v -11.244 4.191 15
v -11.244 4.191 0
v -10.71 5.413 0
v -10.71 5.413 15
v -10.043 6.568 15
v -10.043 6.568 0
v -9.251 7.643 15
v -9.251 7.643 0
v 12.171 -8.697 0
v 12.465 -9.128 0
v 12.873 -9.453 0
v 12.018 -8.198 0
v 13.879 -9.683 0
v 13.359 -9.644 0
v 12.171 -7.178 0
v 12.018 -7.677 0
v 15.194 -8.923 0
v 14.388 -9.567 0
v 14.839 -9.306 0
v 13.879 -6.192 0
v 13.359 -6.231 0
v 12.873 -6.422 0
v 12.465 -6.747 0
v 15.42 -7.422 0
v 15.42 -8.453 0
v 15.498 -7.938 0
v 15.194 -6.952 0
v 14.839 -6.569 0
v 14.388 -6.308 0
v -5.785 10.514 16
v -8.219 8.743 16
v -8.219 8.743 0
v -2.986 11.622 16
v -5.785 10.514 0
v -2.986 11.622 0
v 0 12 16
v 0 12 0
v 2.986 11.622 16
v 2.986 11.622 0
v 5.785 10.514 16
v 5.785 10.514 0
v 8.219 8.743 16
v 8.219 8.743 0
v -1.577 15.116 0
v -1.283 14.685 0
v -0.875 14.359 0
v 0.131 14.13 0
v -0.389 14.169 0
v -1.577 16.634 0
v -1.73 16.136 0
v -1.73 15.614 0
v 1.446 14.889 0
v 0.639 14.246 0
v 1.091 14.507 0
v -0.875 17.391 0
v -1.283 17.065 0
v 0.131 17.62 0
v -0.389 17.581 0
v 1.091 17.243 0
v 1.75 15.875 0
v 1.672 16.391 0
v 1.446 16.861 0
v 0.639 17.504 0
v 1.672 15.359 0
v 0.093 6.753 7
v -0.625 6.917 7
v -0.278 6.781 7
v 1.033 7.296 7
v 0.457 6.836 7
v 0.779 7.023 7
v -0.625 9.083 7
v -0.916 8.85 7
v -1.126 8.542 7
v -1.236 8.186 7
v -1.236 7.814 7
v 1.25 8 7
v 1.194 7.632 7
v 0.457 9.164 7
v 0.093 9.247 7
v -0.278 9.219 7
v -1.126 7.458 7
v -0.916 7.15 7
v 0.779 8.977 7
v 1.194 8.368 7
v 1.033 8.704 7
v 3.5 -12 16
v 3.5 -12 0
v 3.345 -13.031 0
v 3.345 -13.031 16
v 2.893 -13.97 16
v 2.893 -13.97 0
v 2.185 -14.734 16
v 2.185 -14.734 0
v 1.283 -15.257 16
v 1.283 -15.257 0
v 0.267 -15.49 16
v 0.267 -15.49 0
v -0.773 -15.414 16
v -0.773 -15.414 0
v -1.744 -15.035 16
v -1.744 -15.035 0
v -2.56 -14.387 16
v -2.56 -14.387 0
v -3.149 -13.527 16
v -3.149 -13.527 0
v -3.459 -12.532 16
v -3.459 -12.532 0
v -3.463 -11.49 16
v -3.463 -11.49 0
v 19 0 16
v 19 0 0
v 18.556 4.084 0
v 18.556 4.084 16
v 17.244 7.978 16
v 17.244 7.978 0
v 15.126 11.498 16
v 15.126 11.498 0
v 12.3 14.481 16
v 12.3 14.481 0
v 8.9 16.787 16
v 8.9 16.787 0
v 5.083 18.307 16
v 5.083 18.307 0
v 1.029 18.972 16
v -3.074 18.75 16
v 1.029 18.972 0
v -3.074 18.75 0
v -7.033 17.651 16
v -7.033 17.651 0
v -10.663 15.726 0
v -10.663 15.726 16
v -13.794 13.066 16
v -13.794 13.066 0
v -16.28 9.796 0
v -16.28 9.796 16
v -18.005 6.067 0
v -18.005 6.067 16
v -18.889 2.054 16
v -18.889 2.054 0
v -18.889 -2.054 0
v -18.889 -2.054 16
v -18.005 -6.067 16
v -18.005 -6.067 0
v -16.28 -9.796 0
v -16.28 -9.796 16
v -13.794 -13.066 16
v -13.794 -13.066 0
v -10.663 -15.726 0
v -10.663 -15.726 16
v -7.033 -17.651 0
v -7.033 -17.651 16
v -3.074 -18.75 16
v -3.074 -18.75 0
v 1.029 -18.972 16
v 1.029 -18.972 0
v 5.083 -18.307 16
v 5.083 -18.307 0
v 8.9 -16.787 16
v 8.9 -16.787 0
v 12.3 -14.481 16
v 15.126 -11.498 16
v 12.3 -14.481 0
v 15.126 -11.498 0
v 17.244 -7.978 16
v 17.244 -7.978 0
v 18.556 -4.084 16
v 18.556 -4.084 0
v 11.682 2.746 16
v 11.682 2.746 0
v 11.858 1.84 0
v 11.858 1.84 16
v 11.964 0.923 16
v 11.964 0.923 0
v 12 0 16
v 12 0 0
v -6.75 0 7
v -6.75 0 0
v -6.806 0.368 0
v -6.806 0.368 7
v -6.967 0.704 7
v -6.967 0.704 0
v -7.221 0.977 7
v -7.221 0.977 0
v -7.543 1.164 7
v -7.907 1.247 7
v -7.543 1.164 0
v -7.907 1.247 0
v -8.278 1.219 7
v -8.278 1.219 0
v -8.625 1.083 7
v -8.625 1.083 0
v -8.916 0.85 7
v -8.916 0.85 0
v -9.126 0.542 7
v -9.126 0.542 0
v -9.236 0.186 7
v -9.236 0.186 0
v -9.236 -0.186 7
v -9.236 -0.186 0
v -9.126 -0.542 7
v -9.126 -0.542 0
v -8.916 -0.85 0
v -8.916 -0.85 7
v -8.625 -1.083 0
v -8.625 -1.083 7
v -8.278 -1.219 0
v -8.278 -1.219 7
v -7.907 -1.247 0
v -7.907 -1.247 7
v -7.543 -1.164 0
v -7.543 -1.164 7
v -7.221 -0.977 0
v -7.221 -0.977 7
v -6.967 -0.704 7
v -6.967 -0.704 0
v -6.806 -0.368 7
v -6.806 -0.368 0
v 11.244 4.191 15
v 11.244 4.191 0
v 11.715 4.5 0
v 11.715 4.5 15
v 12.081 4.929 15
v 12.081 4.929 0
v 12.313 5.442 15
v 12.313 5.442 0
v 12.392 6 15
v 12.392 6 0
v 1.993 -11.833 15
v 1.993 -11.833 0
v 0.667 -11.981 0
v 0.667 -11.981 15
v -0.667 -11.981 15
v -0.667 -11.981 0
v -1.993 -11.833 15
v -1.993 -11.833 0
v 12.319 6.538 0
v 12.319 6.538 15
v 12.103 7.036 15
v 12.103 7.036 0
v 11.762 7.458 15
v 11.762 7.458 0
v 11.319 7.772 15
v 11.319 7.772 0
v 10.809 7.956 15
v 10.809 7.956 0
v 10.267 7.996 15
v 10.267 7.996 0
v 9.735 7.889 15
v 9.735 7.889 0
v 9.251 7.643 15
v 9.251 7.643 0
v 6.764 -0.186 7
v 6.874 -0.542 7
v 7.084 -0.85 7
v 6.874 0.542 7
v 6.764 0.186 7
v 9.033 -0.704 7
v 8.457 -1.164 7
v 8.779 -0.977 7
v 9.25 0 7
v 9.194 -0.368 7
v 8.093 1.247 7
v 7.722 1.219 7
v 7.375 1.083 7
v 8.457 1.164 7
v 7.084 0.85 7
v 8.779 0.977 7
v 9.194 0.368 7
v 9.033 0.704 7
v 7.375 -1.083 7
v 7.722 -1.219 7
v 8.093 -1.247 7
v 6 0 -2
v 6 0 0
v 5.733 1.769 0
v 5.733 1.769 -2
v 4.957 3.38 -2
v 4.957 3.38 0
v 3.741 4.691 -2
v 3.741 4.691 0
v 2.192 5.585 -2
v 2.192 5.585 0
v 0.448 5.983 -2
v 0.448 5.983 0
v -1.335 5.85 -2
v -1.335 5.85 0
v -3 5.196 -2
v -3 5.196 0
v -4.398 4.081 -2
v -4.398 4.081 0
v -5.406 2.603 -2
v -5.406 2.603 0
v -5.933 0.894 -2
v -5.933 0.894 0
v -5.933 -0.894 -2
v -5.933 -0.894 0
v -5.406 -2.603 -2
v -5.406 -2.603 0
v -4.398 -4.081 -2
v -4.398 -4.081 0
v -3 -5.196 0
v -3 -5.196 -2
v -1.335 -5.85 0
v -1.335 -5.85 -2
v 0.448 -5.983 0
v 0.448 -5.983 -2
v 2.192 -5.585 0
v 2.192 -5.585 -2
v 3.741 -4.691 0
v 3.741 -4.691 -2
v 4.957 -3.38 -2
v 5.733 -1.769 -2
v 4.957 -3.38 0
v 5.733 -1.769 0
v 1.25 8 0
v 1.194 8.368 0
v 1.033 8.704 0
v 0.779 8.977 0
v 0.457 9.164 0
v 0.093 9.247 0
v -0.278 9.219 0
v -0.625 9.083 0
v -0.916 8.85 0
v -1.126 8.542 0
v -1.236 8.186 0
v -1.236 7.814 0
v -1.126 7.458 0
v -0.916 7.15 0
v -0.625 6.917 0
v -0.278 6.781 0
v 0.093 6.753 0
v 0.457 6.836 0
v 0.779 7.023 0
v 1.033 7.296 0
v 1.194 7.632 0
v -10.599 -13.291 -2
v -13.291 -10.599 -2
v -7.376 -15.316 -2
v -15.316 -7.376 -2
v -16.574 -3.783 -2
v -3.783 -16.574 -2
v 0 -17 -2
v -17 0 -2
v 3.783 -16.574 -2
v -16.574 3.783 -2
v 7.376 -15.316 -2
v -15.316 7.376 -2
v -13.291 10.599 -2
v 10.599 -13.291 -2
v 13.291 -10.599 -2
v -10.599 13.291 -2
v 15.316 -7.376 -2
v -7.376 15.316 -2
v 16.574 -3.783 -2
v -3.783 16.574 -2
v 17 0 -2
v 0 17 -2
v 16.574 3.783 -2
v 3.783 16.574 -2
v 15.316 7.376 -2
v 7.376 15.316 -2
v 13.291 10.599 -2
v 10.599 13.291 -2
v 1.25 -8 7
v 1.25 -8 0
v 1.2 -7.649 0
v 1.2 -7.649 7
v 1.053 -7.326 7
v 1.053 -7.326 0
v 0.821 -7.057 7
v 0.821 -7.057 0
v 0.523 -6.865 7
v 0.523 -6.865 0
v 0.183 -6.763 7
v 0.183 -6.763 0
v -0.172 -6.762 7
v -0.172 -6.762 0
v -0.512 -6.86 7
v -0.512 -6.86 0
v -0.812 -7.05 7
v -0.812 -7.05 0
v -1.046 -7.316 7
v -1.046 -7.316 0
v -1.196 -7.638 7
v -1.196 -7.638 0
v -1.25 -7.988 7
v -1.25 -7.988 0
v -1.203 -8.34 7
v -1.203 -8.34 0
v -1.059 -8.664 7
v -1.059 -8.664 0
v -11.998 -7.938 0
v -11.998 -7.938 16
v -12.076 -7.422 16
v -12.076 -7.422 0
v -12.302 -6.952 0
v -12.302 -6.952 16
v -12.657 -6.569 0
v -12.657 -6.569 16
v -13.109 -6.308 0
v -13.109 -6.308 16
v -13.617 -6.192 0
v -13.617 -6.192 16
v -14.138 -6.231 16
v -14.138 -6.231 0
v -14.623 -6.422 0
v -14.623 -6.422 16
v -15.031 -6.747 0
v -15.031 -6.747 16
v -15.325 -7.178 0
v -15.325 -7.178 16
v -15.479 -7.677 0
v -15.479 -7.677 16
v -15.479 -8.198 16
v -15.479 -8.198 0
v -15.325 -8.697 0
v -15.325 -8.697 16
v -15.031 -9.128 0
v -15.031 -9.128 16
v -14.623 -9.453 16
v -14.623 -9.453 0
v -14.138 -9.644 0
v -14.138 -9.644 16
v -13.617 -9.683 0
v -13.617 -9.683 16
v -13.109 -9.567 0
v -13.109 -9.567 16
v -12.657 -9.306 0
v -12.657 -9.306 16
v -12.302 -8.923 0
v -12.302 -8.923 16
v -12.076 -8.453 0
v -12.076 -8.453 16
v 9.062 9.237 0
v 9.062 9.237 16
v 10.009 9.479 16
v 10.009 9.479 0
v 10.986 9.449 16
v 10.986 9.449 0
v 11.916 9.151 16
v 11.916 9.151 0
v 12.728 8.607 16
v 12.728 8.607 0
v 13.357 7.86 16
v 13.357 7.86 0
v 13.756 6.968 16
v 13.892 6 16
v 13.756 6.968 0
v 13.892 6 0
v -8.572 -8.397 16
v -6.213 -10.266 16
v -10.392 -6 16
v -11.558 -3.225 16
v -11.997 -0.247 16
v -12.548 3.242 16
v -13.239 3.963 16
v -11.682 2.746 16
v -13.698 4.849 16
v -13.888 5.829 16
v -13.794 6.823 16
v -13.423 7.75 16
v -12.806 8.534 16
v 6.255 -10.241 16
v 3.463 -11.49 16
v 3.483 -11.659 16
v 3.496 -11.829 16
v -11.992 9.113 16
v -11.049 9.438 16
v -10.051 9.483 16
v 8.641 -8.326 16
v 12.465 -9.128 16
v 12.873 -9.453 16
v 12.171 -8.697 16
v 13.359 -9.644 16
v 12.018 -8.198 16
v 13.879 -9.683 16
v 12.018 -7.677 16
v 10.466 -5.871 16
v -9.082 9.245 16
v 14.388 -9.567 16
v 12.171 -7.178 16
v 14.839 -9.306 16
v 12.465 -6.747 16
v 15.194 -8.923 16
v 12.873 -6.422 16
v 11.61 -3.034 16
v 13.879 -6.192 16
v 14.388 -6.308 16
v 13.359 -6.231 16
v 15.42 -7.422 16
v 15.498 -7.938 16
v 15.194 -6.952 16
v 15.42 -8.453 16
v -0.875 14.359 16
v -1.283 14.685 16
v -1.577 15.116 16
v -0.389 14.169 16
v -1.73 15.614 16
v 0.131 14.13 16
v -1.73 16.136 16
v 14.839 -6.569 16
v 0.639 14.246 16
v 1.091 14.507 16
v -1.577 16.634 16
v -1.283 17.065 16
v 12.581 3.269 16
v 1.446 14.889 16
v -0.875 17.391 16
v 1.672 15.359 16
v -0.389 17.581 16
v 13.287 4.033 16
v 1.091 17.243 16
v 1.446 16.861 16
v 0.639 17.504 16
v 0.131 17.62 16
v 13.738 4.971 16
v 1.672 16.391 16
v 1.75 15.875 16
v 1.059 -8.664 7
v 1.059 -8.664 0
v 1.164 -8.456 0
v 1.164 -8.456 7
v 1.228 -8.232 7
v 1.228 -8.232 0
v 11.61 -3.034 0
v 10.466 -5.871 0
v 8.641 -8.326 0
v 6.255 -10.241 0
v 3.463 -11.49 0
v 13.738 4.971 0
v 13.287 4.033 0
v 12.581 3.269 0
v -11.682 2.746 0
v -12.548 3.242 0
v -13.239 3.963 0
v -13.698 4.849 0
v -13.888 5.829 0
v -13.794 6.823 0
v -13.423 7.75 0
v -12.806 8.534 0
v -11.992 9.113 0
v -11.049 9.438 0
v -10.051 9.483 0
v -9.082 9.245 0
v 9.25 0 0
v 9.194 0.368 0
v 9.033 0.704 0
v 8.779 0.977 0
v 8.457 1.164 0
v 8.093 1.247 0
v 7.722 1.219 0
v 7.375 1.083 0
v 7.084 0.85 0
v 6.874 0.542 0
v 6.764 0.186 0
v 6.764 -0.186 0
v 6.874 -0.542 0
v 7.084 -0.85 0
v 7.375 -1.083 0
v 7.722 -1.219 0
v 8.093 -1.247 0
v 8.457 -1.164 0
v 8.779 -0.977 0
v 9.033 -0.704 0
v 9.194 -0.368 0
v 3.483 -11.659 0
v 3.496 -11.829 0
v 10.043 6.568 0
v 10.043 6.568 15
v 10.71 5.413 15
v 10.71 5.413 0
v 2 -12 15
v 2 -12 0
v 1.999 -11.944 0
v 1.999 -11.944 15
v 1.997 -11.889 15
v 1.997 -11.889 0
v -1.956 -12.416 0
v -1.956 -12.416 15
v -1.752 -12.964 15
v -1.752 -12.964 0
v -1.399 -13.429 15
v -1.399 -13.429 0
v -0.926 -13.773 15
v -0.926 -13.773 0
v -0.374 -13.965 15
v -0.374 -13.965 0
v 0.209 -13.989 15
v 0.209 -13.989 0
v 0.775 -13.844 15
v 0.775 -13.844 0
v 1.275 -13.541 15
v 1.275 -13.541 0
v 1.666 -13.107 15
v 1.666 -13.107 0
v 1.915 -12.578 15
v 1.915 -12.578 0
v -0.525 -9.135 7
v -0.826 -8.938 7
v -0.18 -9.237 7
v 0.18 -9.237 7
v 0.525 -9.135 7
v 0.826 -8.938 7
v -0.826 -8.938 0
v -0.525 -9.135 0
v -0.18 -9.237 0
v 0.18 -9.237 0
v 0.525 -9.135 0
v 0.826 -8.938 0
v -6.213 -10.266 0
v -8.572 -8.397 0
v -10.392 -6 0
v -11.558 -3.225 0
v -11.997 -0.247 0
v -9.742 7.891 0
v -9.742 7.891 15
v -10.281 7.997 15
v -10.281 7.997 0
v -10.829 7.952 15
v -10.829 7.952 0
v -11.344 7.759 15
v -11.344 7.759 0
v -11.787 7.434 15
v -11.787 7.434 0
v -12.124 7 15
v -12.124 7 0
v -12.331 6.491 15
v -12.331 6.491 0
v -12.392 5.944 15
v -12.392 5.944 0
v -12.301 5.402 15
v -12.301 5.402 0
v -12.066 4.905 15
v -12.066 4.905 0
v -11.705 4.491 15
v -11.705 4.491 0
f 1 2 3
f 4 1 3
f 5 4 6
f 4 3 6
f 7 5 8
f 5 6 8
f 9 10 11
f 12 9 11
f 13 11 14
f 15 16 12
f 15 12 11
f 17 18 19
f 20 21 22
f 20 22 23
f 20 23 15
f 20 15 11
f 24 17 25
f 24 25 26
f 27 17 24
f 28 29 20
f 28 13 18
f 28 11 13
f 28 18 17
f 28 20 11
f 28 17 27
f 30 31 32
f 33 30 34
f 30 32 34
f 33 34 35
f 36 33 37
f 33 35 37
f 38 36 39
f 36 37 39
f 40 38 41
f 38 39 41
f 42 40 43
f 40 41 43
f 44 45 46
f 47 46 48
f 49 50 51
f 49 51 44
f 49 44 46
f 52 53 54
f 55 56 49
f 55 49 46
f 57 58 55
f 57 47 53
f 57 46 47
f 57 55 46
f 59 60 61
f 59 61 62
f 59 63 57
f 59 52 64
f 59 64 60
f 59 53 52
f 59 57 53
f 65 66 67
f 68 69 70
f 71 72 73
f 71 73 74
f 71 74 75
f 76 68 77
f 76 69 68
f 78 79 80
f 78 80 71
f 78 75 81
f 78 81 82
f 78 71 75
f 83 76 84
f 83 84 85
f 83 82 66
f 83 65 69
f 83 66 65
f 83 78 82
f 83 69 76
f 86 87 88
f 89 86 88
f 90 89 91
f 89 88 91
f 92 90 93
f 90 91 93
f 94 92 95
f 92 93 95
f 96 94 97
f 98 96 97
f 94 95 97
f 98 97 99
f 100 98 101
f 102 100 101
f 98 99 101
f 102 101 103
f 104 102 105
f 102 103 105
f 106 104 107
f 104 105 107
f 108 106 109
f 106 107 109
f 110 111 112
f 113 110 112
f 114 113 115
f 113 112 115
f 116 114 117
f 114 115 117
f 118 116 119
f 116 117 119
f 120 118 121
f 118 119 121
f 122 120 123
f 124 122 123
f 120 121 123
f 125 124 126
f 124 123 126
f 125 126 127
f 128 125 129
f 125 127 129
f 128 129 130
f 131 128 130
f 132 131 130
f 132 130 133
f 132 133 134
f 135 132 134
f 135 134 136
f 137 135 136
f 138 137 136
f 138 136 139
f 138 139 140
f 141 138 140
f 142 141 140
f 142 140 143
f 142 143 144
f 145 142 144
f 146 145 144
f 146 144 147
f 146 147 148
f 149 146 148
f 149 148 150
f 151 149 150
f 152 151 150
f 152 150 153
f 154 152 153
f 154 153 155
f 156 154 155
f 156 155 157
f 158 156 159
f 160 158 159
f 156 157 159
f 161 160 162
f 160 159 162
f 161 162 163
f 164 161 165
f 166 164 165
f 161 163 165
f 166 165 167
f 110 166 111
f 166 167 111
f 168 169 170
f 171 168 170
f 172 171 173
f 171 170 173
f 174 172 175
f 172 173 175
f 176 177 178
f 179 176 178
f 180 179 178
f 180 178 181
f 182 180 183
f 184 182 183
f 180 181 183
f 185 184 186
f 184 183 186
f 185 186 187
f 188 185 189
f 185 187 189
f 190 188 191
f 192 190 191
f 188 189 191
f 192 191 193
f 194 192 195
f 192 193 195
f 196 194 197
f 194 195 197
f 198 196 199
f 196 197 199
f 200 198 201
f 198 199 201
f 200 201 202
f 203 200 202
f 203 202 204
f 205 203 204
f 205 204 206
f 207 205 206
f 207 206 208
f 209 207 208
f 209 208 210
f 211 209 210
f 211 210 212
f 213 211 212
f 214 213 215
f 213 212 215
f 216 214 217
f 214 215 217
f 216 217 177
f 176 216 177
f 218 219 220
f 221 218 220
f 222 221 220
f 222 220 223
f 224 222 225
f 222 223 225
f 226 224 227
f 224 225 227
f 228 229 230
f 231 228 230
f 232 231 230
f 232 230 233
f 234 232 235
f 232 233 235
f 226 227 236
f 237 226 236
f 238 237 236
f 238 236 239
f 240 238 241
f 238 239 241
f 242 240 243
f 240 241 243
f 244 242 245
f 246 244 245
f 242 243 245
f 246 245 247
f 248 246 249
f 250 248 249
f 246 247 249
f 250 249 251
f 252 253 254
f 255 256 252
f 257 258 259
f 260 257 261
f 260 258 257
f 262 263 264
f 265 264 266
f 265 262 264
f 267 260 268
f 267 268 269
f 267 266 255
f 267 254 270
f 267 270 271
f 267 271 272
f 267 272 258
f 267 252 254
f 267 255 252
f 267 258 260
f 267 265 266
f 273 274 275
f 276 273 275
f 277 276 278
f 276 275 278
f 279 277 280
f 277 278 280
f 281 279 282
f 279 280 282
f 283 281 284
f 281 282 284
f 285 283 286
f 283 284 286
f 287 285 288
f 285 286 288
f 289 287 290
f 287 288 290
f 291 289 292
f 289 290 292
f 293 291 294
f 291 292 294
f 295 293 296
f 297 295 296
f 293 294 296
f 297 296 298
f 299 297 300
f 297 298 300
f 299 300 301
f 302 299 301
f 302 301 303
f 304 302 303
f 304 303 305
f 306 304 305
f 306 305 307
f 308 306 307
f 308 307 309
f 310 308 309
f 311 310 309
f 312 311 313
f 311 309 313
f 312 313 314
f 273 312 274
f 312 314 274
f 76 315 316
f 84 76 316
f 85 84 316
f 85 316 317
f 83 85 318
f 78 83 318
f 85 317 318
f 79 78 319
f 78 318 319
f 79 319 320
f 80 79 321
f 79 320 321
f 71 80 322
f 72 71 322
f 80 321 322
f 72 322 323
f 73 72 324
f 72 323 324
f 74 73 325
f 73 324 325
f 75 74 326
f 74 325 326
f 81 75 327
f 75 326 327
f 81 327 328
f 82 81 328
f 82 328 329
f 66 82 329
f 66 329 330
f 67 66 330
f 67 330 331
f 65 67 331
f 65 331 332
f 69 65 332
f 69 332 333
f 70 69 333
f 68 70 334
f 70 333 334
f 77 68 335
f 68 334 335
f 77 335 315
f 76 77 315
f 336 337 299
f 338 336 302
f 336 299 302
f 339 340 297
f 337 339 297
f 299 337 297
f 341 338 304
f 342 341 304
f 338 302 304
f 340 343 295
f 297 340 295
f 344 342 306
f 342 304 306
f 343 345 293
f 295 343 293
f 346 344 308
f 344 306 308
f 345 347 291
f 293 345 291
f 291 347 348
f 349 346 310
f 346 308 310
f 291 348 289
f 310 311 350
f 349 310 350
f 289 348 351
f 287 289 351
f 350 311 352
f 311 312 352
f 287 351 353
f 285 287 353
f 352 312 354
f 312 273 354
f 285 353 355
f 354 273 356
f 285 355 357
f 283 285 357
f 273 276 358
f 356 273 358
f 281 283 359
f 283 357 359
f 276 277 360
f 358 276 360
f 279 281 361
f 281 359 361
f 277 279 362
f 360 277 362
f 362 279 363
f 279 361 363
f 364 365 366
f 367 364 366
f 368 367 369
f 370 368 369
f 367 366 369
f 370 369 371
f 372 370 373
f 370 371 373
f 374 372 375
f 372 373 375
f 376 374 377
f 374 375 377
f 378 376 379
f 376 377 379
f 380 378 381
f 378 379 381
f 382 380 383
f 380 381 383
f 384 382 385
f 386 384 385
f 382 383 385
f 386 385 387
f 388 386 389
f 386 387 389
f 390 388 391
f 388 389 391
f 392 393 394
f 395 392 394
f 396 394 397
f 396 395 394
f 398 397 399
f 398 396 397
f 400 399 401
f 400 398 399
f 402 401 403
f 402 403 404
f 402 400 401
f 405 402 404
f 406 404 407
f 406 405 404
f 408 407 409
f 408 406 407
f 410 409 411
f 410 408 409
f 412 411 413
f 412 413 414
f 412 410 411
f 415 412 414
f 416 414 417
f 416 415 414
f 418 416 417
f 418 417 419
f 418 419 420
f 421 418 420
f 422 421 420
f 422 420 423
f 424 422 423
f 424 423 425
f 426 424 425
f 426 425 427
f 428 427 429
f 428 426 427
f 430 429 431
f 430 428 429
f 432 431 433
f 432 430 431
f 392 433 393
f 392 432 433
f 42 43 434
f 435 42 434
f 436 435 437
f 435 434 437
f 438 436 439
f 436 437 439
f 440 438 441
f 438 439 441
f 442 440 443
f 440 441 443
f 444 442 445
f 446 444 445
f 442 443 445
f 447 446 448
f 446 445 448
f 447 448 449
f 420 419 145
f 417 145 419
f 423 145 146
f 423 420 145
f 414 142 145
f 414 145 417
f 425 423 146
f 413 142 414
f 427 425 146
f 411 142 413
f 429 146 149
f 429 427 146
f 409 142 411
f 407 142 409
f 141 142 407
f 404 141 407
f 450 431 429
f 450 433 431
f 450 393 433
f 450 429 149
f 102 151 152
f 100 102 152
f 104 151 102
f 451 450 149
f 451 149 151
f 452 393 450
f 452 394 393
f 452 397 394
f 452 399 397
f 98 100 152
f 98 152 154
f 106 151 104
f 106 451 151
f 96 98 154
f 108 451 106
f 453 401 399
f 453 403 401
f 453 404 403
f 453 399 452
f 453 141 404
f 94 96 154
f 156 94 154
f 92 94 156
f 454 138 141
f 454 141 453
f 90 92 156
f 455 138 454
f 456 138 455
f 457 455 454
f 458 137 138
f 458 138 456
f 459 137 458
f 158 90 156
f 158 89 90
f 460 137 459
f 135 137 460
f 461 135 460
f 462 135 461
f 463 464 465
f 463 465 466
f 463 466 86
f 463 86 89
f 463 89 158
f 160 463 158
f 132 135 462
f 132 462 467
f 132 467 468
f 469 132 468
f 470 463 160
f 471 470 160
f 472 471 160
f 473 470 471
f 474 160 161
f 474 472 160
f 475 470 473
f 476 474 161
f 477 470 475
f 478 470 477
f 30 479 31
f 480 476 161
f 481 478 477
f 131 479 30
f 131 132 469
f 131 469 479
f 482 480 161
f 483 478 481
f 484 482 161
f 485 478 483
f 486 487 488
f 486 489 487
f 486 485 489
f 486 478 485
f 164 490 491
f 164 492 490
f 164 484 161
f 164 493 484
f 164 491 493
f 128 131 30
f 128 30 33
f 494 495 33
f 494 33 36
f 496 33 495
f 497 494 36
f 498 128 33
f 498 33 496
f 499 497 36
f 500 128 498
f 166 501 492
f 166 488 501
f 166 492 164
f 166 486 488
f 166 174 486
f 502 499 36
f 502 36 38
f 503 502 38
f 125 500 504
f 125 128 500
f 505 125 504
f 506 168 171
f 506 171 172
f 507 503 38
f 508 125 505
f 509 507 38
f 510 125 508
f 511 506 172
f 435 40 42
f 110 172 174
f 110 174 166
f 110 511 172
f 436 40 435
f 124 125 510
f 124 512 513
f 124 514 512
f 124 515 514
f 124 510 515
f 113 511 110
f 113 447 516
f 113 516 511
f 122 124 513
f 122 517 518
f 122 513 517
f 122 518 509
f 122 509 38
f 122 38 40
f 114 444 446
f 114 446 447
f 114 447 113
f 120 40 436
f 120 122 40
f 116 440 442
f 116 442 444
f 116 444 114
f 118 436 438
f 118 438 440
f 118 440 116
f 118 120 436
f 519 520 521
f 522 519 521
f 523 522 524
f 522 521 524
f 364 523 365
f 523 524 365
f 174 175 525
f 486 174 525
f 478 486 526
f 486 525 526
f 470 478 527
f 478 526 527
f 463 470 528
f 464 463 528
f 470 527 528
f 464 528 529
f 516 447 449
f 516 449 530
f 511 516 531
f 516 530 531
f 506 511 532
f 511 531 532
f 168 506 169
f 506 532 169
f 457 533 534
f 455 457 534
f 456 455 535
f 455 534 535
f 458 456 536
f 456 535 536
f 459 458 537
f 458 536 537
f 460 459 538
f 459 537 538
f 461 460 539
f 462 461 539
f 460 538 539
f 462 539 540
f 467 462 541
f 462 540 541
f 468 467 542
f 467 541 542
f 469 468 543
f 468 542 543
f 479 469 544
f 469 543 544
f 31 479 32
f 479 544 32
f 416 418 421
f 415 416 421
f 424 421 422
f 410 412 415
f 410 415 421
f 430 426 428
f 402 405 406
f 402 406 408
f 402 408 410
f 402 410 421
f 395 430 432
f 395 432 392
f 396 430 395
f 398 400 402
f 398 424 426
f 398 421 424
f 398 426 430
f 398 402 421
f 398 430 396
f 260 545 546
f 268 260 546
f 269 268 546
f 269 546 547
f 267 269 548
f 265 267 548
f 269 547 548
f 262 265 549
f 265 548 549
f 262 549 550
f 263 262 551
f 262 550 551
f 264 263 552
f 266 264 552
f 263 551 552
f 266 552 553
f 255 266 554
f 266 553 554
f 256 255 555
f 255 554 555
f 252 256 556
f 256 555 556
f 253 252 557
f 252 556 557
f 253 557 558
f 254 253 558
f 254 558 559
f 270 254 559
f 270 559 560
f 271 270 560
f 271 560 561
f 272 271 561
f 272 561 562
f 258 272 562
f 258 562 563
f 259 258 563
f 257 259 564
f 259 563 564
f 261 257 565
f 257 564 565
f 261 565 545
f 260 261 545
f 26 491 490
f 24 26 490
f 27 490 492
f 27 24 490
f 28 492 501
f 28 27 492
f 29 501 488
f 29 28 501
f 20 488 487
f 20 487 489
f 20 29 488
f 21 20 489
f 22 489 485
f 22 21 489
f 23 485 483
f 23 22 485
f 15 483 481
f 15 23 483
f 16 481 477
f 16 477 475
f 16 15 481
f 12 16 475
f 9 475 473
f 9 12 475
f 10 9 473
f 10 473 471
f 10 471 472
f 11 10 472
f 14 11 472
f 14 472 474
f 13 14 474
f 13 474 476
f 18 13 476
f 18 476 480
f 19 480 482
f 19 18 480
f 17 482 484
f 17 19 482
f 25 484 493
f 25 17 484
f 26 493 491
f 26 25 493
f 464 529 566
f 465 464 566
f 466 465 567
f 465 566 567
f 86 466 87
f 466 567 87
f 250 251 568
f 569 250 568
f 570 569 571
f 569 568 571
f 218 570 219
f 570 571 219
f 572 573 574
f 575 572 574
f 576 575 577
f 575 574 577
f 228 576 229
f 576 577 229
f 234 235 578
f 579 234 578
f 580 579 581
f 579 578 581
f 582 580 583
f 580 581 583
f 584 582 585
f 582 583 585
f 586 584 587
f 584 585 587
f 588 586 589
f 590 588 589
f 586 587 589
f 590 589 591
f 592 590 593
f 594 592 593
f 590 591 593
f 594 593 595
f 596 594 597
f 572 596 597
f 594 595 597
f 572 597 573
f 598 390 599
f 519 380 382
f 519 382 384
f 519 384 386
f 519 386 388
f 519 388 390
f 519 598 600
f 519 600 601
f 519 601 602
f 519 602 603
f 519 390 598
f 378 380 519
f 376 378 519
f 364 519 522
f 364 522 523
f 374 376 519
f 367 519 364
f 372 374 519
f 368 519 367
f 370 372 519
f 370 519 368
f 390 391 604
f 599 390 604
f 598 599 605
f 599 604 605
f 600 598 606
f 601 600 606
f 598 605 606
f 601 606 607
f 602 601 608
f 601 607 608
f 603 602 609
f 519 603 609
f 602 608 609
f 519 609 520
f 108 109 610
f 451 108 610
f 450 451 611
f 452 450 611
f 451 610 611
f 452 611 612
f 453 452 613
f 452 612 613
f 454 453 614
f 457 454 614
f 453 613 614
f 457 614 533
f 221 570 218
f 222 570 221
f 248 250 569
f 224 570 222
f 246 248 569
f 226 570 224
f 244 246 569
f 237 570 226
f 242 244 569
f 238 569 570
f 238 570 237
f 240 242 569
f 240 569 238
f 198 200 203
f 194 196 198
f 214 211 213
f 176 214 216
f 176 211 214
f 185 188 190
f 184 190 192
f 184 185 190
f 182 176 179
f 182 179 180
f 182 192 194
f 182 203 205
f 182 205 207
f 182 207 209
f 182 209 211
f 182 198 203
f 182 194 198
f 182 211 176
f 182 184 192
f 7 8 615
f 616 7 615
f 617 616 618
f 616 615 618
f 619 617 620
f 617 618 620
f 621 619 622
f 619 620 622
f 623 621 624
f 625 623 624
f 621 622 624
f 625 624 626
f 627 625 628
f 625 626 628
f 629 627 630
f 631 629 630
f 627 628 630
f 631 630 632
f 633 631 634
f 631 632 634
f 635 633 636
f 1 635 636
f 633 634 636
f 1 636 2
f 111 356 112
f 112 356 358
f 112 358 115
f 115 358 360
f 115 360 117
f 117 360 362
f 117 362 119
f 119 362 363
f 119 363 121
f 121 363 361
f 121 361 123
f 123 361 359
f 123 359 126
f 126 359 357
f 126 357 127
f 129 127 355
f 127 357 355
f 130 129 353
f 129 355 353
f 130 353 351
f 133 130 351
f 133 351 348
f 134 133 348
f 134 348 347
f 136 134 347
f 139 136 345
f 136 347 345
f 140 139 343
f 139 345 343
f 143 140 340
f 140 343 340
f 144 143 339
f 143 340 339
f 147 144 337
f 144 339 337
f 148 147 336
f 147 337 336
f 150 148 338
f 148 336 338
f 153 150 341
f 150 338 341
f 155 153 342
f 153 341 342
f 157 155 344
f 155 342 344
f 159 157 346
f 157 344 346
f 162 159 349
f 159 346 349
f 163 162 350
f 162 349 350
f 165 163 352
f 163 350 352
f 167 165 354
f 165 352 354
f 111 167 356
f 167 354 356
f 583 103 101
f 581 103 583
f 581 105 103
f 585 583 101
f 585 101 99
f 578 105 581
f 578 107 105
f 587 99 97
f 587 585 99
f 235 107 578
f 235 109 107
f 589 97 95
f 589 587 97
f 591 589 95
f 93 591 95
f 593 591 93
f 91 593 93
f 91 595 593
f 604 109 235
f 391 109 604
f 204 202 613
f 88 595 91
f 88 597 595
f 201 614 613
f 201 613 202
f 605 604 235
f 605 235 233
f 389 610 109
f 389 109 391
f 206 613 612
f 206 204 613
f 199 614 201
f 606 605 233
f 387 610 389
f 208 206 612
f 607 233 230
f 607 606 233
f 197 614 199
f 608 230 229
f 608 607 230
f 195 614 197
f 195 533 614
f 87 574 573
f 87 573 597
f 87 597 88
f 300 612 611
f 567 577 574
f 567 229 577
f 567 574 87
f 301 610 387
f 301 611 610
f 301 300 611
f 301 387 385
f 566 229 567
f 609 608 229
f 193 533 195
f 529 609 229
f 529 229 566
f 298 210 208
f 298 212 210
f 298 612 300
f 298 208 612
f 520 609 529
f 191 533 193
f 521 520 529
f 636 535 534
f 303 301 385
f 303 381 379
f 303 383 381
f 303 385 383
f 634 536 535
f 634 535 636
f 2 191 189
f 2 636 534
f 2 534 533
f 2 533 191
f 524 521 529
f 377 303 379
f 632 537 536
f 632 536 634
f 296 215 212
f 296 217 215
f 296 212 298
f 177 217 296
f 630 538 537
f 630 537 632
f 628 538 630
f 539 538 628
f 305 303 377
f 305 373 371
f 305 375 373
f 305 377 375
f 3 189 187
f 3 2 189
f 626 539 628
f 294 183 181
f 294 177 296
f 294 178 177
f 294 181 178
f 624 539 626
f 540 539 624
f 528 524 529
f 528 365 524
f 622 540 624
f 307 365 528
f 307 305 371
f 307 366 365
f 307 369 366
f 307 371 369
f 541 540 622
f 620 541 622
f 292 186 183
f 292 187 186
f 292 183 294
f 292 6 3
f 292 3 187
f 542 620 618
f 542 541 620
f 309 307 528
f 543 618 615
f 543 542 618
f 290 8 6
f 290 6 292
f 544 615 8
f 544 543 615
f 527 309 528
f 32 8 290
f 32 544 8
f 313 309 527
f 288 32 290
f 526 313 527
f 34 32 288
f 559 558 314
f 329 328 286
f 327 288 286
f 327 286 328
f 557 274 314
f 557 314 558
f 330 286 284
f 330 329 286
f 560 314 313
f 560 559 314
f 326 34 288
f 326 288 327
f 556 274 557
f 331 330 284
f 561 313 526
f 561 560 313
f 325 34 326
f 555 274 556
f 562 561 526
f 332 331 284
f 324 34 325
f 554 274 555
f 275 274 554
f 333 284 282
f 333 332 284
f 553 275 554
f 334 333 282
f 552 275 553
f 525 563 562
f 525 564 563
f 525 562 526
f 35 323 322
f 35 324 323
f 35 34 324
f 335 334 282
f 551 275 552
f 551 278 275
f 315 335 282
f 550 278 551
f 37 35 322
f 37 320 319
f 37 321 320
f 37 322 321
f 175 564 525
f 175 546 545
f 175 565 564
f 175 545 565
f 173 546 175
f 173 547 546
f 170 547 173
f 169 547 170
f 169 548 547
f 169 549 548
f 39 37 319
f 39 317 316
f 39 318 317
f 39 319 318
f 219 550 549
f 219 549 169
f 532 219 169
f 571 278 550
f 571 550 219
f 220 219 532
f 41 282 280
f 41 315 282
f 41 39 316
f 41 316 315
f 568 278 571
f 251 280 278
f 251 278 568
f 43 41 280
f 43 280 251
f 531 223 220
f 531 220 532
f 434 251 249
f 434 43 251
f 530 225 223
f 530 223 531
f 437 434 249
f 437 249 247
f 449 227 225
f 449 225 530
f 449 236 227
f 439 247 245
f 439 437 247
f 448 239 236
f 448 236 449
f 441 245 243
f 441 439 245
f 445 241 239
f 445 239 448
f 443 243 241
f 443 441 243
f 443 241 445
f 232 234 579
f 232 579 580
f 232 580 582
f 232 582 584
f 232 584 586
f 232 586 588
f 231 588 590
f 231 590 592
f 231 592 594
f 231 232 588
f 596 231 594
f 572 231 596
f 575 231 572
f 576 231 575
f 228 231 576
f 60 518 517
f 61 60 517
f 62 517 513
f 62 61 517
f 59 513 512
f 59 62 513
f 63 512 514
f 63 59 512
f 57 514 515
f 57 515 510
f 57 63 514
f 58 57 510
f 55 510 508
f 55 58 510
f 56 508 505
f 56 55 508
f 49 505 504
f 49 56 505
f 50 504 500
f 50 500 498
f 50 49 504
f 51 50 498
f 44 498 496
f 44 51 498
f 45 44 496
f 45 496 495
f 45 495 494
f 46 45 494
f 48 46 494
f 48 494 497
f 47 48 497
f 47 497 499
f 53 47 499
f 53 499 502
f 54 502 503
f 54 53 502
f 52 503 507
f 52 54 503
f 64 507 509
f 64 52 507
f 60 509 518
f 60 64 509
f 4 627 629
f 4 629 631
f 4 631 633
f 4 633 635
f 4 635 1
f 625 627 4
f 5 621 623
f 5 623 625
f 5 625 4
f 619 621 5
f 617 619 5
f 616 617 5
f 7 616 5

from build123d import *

# Parameters (mm, degrees)
F0_R         = 19
F0_R_2       = 1.75
F1_DEPTH     = 16
F0_R_3       = 1.25
F0_R_4       = 6
F1_FACE_R    = 19
F1_FACE_R_2  = 1.75
F1_FACE1_R   = 19
F1_FACE1_R_2 = 1.75
F2_DEPTH     = 2
F3_DEPTH     = 7
F5_DEPTH     = 15


# Not quite as in the source:
# - a fillet or chamfer that OpenCascade refuses, or shapes differently, is made with other operations: its cross-section is extruded or revolved along the edge and cut away or added


with BuildPart() as f1:
    # F0 (on Top) → F1 (new body)
    with BuildSketch(Plane.XY):
        Circle(F0_R)
        with Locations((-13.7481532851, -7.9375)):
            Circle(F0_R_2, mode=Mode.SUBTRACT)
        with BuildLine():
            ThreePointArc((11.6815620975, 2.746107602), (11.9201246883, 1.3822544682), (12, 0))
            ThreePointArc((12, 0), (9.6320035623, -7.1571298281), (3.4625821039, -11.4895833333))
            ThreePointArc((3.4625821039, -11.4895833333), (3.4906329916, -11.7441068228), (3.5, -12))
            ThreePointArc((3.5, -12), (-0.2558931772, -15.4906329916), (-3.4625821039, -11.4895833333))
            ThreePointArc((-3.4625821039, -11.4895833333), (-10.3923048454, -6), (-11.6815620975, 2.746107602))
            ThreePointArc((-11.6815620975, 2.746107602), (-13.4233937587, 7.75), (-8.2189799936, 8.7434757314))
            ThreePointArc((-8.2189799936, 8.7434757314), (0, 12), (8.2189799936, 8.7434757314))
            ThreePointArc((8.2189799936, 8.7434757314), (11.9160113491, 9.1509234346), (13.8923048454, 6))
            ThreePointArc((13.8923048454, 6), (13.2873351028, 4.0330735121), (11.6815620975, 2.746107602))
        make_face(mode=Mode.SUBTRACT)
        with Locations((13.7481532851, -7.9375)):
            Circle(F0_R_2, mode=Mode.SUBTRACT)
        with Locations((0, 15.875)):
            Circle(F0_R_2, mode=Mode.SUBTRACT)
    extrude(amount=F1_DEPTH)

    # F0 (on Top) + F1_face (on face) + F1_face1 (on face) → F2 (join)
    with BuildSketch(Plane.XY):
        Circle(F0_R)
        with Locations((-13.7481532851, -7.9375)):
            Circle(F0_R_2, mode=Mode.SUBTRACT)
        with BuildLine():
            ThreePointArc((11.6815620975, 2.746107602), (11.9201246883, 1.3822544682), (12, 0))
            ThreePointArc((12, 0), (9.6320035623, -7.1571298281), (3.4625821039, -11.4895833333))
            ThreePointArc((3.4625821039, -11.4895833333), (3.4906329916, -11.7441068228), (3.5, -12))
            ThreePointArc((3.5, -12), (-0.2558931772, -15.4906329916), (-3.4625821039, -11.4895833333))
            ThreePointArc((-3.4625821039, -11.4895833333), (-10.3923048454, -6), (-11.6815620975, 2.746107602))
            ThreePointArc((-11.6815620975, 2.746107602), (-13.4233937587, 7.75), (-8.2189799936, 8.7434757314))
            ThreePointArc((-8.2189799936, 8.7434757314), (0, 12), (8.2189799936, 8.7434757314))
            ThreePointArc((8.2189799936, 8.7434757314), (11.9160113491, 9.1509234346), (13.8923048454, 6))
            ThreePointArc((13.8923048454, 6), (13.2873351028, 4.0330735121), (11.6815620975, 2.746107602))
        make_face(mode=Mode.SUBTRACT)
        with Locations((13.7481532851, -7.9375)):
            Circle(F0_R_2, mode=Mode.SUBTRACT)
        with Locations((0, 15.875)):
            Circle(F0_R_2, mode=Mode.SUBTRACT)
        with BuildLine():
            ThreePointArc((3.4625821039, -11.4895833333), (9.6320035623, -7.1571298281), (12, 0))
            ThreePointArc((12, 0), (11.9201246883, 1.3822544682), (11.6815620975, 2.746107602))
            ThreePointArc((11.6815620975, 2.746107602), (7.3612159322, 4.25), (8.2189799936, 8.7434757314))
            ThreePointArc((8.2189799936, 8.7434757314), (0, 12), (-8.2189799936, 8.7434757314))
            ThreePointArc((-8.2189799936, 8.7434757314), (-7.2413814108, 7.5237065037), (-6.8923048454, 6))
            ThreePointArc((-6.8923048454, 6), (-8.4253783575, 3.1049697426), (-11.6815620975, 2.746107602))
            ThreePointArc((-11.6815620975, 2.746107602), (-10.3923048454, -6), (-3.4625821039, -11.4895833333))
            ThreePointArc((-3.4625821039, -11.4895833333), (-2.6659165155, -9.732206109), (-1.0590188837, -8.6640625))
            ThreePointArc((-1.0590188837, -8.6640625), (-0.3454897939, -6.79869371), (1.25, -8))
            ThreePointArc((1.25, -8), (1.20130629, -8.3454897939), (1.0590188837, -8.6640625))
            ThreePointArc((1.0590188837, -8.6640625), (2.6659165155, -9.732206109), (3.4625821039, -11.4895833333))
        make_face()
        with Locations((-8, 0)):
            Circle(F0_R_3, mode=Mode.SUBTRACT)
        Circle(F0_R_4, mode=Mode.SUBTRACT)
        with Locations((8, 0)):
            Circle(F0_R_3, mode=Mode.SUBTRACT)
        with Locations((0, 8)):
            Circle(F0_R_3, mode=Mode.SUBTRACT)
        with BuildLine():
            ThreePointArc((11.2444890067, 4.1906404019), (11.4857574222, 3.4752519965), (11.6815620975, 2.746107602))
            ThreePointArc((11.6815620975, 2.746107602), (13.2873351028, 4.0330735121), (13.8923048454, 6))
            ThreePointArc((13.8923048454, 6), (11.9160113491, 9.1509234346), (8.2189799936, 8.7434757314))
            ThreePointArc((8.2189799936, 8.7434757314), (8.7525352246, 8.2093317111), (9.2514455495, 7.6426929314))
            ThreePointArc((9.2514455495, 7.6426929314), (11.3192032779, 7.7722469624), (12.3923048454, 6))
            ThreePointArc((12.3923048454, 6), (12.0811459159, 4.928638325), (11.2444890067, 4.1906404019))
        make_face()
        with BuildLine():
            ThreePointArc((3.5, -12), (3.4906329916, -11.7441068228), (3.4625821039, -11.4895833333))
            ThreePointArc((3.4625821039, -11.4895833333), (2.7332221976, -11.6845837075), (1.9930434572, -11.8333333333))
            ThreePointArc((1.9930434572, -11.8333333333), (1.9982601075, -11.916594108), (2, -12))
            ThreePointArc((2, -12), (-0.083405892, -13.9982601075), (-1.9930434572, -11.8333333333))
            ThreePointArc((-1.9930434572, -11.8333333333), (-2.7332221976, -11.6845837075), (-3.4625821039, -11.4895833333))
            ThreePointArc((-3.4625821039, -11.4895833333), (-0.2558931772, -15.4906329916), (3.5, -12))
        make_face()
        with BuildLine():
            ThreePointArc((-9.2514455495, 7.6426929314), (-8.7525352246, 8.2093317111), (-8.2189799936, 8.7434757314))
            ThreePointArc((-8.2189799936, 8.7434757314), (-13.4233937587, 7.75), (-11.6815620975, 2.746107602))
            ThreePointArc((-11.6815620975, 2.746107602), (-11.4857574222, 3.4752519965), (-11.2444890067, 4.1906404019))
            ThreePointArc((-11.2444890067, 4.1906404019), (-12.124355653, 7), (-9.2514455495, 7.6426929314))
        make_face()
        with BuildLine():
            ThreePointArc((8.2189799936, 8.7434757314), (7.3612159322, 4.25), (11.6815620975, 2.746107602))
            ThreePointArc((11.6815620975, 2.746107602), (11.4857574222, 3.4752519965), (11.2444890067, 4.1906404019))
            ThreePointArc((11.2444890067, 4.1906404019), (8.6602540378, 5), (9.2514455495, 7.6426929314))
            ThreePointArc((9.2514455495, 7.6426929314), (8.7525352246, 8.2093317111), (8.2189799936, 8.7434757314))
        make_face()
        with BuildLine():
            ThreePointArc((-6.8923048454, 6), (-7.2413814108, 7.5237065037), (-8.2189799936, 8.7434757314))
            ThreePointArc((-8.2189799936, 8.7434757314), (-8.7525352246, 8.2093317111), (-9.2514455495, 7.6426929314))
            ThreePointArc((-9.2514455495, 7.6426929314), (-8.620057883, 6.9268984325), (-8.3923048454, 6))
            ThreePointArc((-8.3923048454, 6), (-9.3209431704, 4.3111589295), (-11.2444890067, 4.1906404019))
            ThreePointArc((-11.2444890067, 4.1906404019), (-11.4857574222, 3.4752519965), (-11.6815620975, 2.746107602))
            ThreePointArc((-11.6815620975, 2.746107602), (-8.4253783575, 3.1049697426), (-6.8923048454, 6))
        make_face()
        with BuildLine():
            ThreePointArc((1.9930434572, -11.8333333333), (2.7332221976, -11.6845837075), (3.4625821039, -11.4895833333))
            ThreePointArc((3.4625821039, -11.4895833333), (2.6659165155, -9.732206109), (1.0590188837, -8.6640625))
            ThreePointArc((1.0590188837, -8.6640625), (0, -9.25), (-1.0590188837, -8.6640625))
            ThreePointArc((-1.0590188837, -8.6640625), (-2.6659165155, -9.732206109), (-3.4625821039, -11.4895833333))
            ThreePointArc((-3.4625821039, -11.4895833333), (-2.7332221976, -11.6845837075), (-1.9930434572, -11.8333333333))
            ThreePointArc((-1.9930434572, -11.8333333333), (0, -10), (1.9930434572, -11.8333333333))
        make_face()
        with Locations((-13.7481532851, -7.9375)):
            Circle(F0_R_2)
        with Locations((13.7481532851, -7.9375)):
            Circle(F0_R_2)
        with Locations((0, 15.875)):
            Circle(F0_R_2)
        with BuildLine():
            ThreePointArc((9.2514455495, 7.6426929314), (10.3923048454, 6), (11.2444890067, 4.1906404019))
            ThreePointArc((11.2444890067, 4.1906404019), (12.0811459159, 4.928638325), (12.3923048454, 6))
            ThreePointArc((12.3923048454, 6), (11.3192032779, 7.7722469624), (9.2514455495, 7.6426929314))
        make_face()
        with BuildLine():
            ThreePointArc((-11.2444890067, 4.1906404019), (-10.3923048454, 6), (-9.2514455495, 7.6426929314))
            ThreePointArc((-9.2514455495, 7.6426929314), (-12.124355653, 7), (-11.2444890067, 4.1906404019))
        make_face()
        with BuildLine():
            ThreePointArc((2, -12), (1.9982601075, -11.916594108), (1.9930434572, -11.8333333333))
            ThreePointArc((1.9930434572, -11.8333333333), (0, -12), (-1.9930434572, -11.8333333333))
            ThreePointArc((-1.9930434572, -11.8333333333), (-0.083405892, -13.9982601075), (2, -12))
        make_face()
        with BuildLine():
            ThreePointArc((9.2514455495, 7.6426929314), (8.6602540378, 5), (11.2444890067, 4.1906404019))
            ThreePointArc((11.2444890067, 4.1906404019), (10.3923048454, 6), (9.2514455495, 7.6426929314))
        make_face()
        with BuildLine():
            ThreePointArc((-8.3923048454, 6), (-8.620057883, 6.9268984325), (-9.2514455495, 7.6426929314))
            ThreePointArc((-9.2514455495, 7.6426929314), (-10.3923048454, 6), (-11.2444890067, 4.1906404019))
            ThreePointArc((-11.2444890067, 4.1906404019), (-9.3209431704, 4.3111589295), (-8.3923048454, 6))
        make_face()
        with BuildLine():
            ThreePointArc((-1.9930434572, -11.8333333333), (0, -12), (1.9930434572, -11.8333333333))
            ThreePointArc((1.9930434572, -11.8333333333), (0, -10), (-1.9930434572, -11.8333333333))
        make_face()
        with Locations((0, 8)):
            Circle(F0_R_3)
        with Locations((8, 0)):
            Circle(F0_R_3)
        with Locations((-8, 0)):
            Circle(F0_R_3)
        with BuildLine():
            ThreePointArc((-1.0590188837, -8.6640625), (0, -8.5), (1.0590188837, -8.6640625))
            ThreePointArc((1.0590188837, -8.6640625), (1.20130629, -8.3454897939), (1.25, -8))
            ThreePointArc((1.25, -8), (-0.3454897939, -6.79869371), (-1.0590188837, -8.6640625))
        make_face()
        with BuildLine():
            ThreePointArc((-1.0590188837, -8.6640625), (0, -9.25), (1.0590188837, -8.6640625))
            ThreePointArc((1.0590188837, -8.6640625), (0, -8.5), (-1.0590188837, -8.6640625))
        make_face()
    with BuildSketch(Plane(origin=(0, 0, 0), x_dir=(1, 0, 0), z_dir=(0, 0, -1))):
        Circle(F1_FACE_R)
        with Locations((-13.7481532851, 7.9375)):
            Circle(F1_FACE_R_2, mode=Mode.SUBTRACT)
        with BuildLine():
            ThreePointArc((-8.2189799936, -8.7434757314), (-13.4233937587, -7.75), (-11.6815620975, -2.746107602))
            ThreePointArc((-11.6815620975, -2.746107602), (-10.3923048454, 6), (-3.4625821039, 11.4895833333))
            ThreePointArc((-3.4625821039, 11.4895833333), (0, 15.5), (3.4625821039, 11.4895833333))
            ThreePointArc((3.4625821039, 11.4895833333), (10.3923048454, 6), (11.6815620975, -2.746107602))
            ThreePointArc((11.6815620975, -2.746107602), (13.4233937587, -7.75), (8.2189799936, -8.7434757314))
            ThreePointArc((8.2189799936, -8.7434757314), (0, -12), (-8.2189799936, -8.7434757314))
        make_face(mode=Mode.SUBTRACT)
        with Locations((13.7481532851, 7.9375)):
            Circle(F1_FACE_R_2, mode=Mode.SUBTRACT)
        with Locations((0, -15.875)):
            Circle(F1_FACE_R_2, mode=Mode.SUBTRACT)
    with BuildSketch(Plane.XY.offset(16)):
        Circle(F1_FACE1_R)
        with Locations((-13.7481532851, -7.9375)):
            Circle(F1_FACE1_R_2, mode=Mode.SUBTRACT)
        with BuildLine():
            ThreePointArc((-11.6815620975, 2.746107602), (-13.4233937587, 7.75), (-8.2189799936, 8.7434757314))
            ThreePointArc((-8.2189799936, 8.7434757314), (0, 12), (8.2189799936, 8.7434757314))
            ThreePointArc((8.2189799936, 8.7434757314), (13.4233937587, 7.75), (11.6815620975, 2.746107602))
            ThreePointArc((11.6815620975, 2.746107602), (10.3923048454, -6), (3.4625821039, -11.4895833333))
            ThreePointArc((3.4625821039, -11.4895833333), (0, -15.5), (-3.4625821039, -11.4895833333))
            ThreePointArc((-3.4625821039, -11.4895833333), (-10.3923048454, -6), (-11.6815620975, 2.746107602))
        make_face(mode=Mode.SUBTRACT)
        with Locations((13.7481532851, -7.9375)):
            Circle(F1_FACE1_R_2, mode=Mode.SUBTRACT)
        with Locations((0, 15.875)):
            Circle(F1_FACE1_R_2, mode=Mode.SUBTRACT)
    extrude(amount=-F2_DEPTH, dir=(0, 0, 1))

    # F0 (on Top) → F3 (join)
    with BuildSketch(Plane.XY):
        with Locations((-8, 0)):
            Circle(F0_R_3)
        with Locations((0, 8)):
            Circle(F0_R_3)
        with Locations((8, 0)):
            Circle(F0_R_3)
        with BuildLine():
            ThreePointArc((-1.0590188837, -8.6640625), (0, -8.5), (1.0590188837, -8.6640625))
            ThreePointArc((1.0590188837, -8.6640625), (1.20130629, -8.3454897939), (1.25, -8))
            ThreePointArc((1.25, -8), (-0.3454897939, -6.79869371), (-1.0590188837, -8.6640625))
        make_face()
        with BuildLine():
            ThreePointArc((-1.0590188837, -8.6640625), (0, -9.25), (1.0590188837, -8.6640625))
            ThreePointArc((1.0590188837, -8.6640625), (0, -8.5), (-1.0590188837, -8.6640625))
        make_face()
    extrude(amount=F3_DEPTH)

    # F4: chamfer of 2 on 1 edges, made by hand

    # F4_s1 → F4_t2 (revolve, cut)
    with BuildSketch(Plane.XZ):
        Polygon((19, 0), (17, -2), (19, -2), align=None)
    revolve(axis=Axis((0, 0, -2), (0, 0, 1)), mode=Mode.SUBTRACT)

    # F0 (on Top) → F5 (join)
    with BuildSketch(Plane.XY):
        with BuildLine():
            ThreePointArc((-11.2444890067, 4.1906404019), (-10.3923048454, 6), (-9.2514455495, 7.6426929314))
            ThreePointArc((-9.2514455495, 7.6426929314), (-12.124355653, 7), (-11.2444890067, 4.1906404019))
        make_face()
        with BuildLine():
            ThreePointArc((9.2514455495, 7.6426929314), (10.3923048454, 6), (11.2444890067, 4.1906404019))
            ThreePointArc((11.2444890067, 4.1906404019), (12.0811459159, 4.928638325), (12.3923048454, 6))
            ThreePointArc((12.3923048454, 6), (11.3192032779, 7.7722469624), (9.2514455495, 7.6426929314))
        make_face()
        with BuildLine():
            ThreePointArc((2, -12), (1.9982601075, -11.916594108), (1.9930434572, -11.8333333333))
            ThreePointArc((1.9930434572, -11.8333333333), (0, -12), (-1.9930434572, -11.8333333333))
            ThreePointArc((-1.9930434572, -11.8333333333), (-0.083405892, -13.9982601075), (2, -12))
        make_face()
    extrude(amount=F5_DEPTH)


solid = f1.part
